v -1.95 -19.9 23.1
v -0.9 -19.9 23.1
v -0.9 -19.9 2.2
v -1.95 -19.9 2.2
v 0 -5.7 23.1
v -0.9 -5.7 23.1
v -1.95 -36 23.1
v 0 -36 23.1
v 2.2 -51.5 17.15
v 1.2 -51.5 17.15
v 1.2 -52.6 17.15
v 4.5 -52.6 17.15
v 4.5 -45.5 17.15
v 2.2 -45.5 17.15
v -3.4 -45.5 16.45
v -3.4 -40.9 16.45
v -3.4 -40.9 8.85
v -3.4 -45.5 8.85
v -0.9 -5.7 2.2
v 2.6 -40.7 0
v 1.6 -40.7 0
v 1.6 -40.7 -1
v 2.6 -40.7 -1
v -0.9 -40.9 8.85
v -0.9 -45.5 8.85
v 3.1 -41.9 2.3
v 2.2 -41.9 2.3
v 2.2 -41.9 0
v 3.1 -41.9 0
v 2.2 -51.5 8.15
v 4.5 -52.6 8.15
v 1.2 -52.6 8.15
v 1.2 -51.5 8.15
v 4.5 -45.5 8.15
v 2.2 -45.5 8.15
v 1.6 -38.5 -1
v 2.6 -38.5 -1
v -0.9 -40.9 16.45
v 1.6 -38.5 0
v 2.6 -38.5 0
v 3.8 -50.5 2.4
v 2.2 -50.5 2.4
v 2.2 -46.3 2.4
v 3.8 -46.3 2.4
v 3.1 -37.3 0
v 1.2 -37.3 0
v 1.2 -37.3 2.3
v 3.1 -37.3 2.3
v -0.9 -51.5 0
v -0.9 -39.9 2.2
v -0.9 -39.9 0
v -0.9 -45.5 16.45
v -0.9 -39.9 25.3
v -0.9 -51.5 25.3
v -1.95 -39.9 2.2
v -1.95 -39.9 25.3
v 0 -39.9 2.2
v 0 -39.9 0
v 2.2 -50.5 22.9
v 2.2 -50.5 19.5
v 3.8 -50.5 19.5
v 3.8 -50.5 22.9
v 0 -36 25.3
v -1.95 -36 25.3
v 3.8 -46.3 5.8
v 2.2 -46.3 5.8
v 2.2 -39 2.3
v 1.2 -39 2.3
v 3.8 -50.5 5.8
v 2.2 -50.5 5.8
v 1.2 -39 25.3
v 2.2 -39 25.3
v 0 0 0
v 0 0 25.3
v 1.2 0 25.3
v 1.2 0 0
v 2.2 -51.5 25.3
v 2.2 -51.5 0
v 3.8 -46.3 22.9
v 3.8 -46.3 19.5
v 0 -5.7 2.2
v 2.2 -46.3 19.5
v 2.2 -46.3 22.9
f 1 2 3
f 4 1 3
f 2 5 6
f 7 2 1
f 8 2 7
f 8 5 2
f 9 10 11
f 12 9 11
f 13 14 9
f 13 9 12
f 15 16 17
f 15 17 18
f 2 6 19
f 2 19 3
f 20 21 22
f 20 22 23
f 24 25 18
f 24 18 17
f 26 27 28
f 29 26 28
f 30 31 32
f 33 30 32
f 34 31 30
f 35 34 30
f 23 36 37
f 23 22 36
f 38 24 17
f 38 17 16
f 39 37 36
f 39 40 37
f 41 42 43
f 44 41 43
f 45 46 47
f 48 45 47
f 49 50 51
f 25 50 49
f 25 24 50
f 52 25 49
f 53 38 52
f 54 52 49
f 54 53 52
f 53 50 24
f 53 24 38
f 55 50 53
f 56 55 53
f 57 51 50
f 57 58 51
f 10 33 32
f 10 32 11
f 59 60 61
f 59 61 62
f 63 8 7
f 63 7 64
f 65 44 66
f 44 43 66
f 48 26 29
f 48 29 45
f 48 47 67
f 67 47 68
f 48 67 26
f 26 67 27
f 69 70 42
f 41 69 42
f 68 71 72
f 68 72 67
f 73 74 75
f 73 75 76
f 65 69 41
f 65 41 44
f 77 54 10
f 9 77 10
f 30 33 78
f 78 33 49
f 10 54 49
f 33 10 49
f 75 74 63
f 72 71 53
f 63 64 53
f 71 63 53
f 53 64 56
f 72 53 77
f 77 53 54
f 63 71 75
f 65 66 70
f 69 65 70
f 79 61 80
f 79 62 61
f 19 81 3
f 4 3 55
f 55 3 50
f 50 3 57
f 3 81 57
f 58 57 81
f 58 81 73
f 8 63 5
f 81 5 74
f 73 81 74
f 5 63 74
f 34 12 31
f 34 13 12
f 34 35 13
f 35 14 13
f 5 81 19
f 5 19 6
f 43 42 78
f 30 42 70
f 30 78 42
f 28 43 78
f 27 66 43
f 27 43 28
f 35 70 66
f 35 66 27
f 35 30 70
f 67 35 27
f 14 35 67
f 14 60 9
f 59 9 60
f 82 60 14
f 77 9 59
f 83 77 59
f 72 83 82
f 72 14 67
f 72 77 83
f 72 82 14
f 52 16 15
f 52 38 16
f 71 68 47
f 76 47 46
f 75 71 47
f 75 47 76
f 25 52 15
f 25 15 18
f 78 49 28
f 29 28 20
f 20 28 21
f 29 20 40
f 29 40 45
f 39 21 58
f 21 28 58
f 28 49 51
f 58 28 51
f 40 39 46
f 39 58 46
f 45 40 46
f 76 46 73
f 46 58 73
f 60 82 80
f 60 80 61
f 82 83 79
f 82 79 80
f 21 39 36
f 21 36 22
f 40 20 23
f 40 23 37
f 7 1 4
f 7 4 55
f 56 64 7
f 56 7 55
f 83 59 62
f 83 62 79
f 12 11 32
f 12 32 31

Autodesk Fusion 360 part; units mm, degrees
sketch "Sketch1" plane through (0, 0, 0) normal (1, 0, 0) x (0, 1, 0)
  line L0 (0, 0) -> (-51.5, 0)
  line L1 (-51.5, 0) -> (-51.5, 25.3)
  line L2 (-51.5, 25.3) -> (0, 25.3)
  line L3 (0, 25.3) -> (0, 0)
  dimension "d1" = 25.3
  dimension "d2" = 51.5
extrude "Extrude1" add sketch "Sketch1" along normal blind 1.2 makes body 1
sketch "Sketch2" plane through (0, -51.5, 0) normal (0, -1, 0) x (1, 0, 0)
  line L0 (0, 25.3) -> (0, 0)
  line L1 (0, 0) -> (1.2, 0)
  line L2 (1.2, 0) -> (1.2, 25.3)
  line L3 (1.2, 25.3) -> (0, 25.3)
  line L4 (1.2, 17.15) -> (4.5, 17.15)
  line L5 (4.5, 17.15) -> (4.5, 8.15)
  line L6 (4.5, 8.15) -> (1.2, 8.15)
  line L7 (1.2, 8.15) -> (1.2, 17.15)
  line L8 (4.5, 12.65) -> (1.2, 12.65)
  line L9 (1.2, 25.3) -> (1.2, 0)
  dimension "d5" = 9
  dimension "d7" = 4.5
extrude "Extrude2" add sketch "Sketch2" along normal blind 1.1 and the other way blind 6 separate body contours L2 L4 L5 L7 L8 L9 | L2 L5 L6 L7 L8 L9 makes body 2
sketch "Sketch3" plane through (1.2, 0, 0) normal (1, 0, 0) x (0, 1, 0)
  line L0 (0, 25.3) -> (-51.5, 25.3)
  line L1 (-51.5, 25.3) -> (-51.5, 0)
  line L2 (-51.5, 0) -> (0, 0)
  line L3 (0, 0) -> (0, 25.3)
  line L4 (-50.5, 22.9) -> (-46.3, 22.9)
  line L5 (-46.3, 22.9) -> (-46.3, 19.5)
  line L6 (-46.3, 19.5) -> (-50.5, 19.5)
  line L7 (-50.5, 19.5) -> (-50.5, 22.9)
  line L8 (0, 12.65) -> (-51.5, 12.65)
  line L9 (-46.3, 2.4) -> (-46.3, 5.8)
  line L10 (-50.5, 2.4) -> (-46.3, 2.4)
  line L11 (-50.5, 5.8) -> (-50.5, 2.4)
  line L12 (-46.3, 5.8) -> (-50.5, 5.8)
  dimension "d12" = 3.4
  dimension "d13" = 4.2
  dimension "d14" = 2.4
  dimension "d15" = 1
extrude "Extrude3" add sketch "Sketch3" along normal blind 2.6 contours L4 L5 L6 L7 | L9 L10 L11 L12 bodies 1
sketch "Sketch4" plane through (0, 0, 0) normal (-1, 0, 0) x (0, -1, 0)
  line L0 (51.5, 25.3) -> (0, 25.3)
  line L1 (0, 25.3) -> (0, 0)
  line L2 (0, 0) -> (51.5, 0)
  line L3 (51.5, 0) -> (51.5, 25.3)
  line L4 (40.9, 16.45) -> (45.5, 16.45)
  line L5 (45.5, 16.45) -> (45.5, 8.85)
  line L6 (45.5, 8.85) -> (40.9, 8.85)
  line L7 (40.9, 8.85) -> (40.9, 16.45)
  line L8 (51.5, 25.3) -> (51.5, 0)
  line L9 (40.9, 12.65) -> (45.5, 12.65)
  line L10 (51.5, 12.65) -> (0, 12.65)
  dimension "d18" = 7.6
  dimension "d19" = 4.6
  dimension "d20" = 6
extrude "Extrude4" add sketch "Sketch4" along normal blind 3.4 contours L4 L5 L7 L9 L10 | L5 L6 L7 L9 L10 bodies 1
sketch "Sketch5" plane through (1.2, 0, 0) normal (1, 0, 0) x (0, 1, 0)
  line L0 (-46.3, 5.8) -> (-46.3, 2.4)
  line L1 (-46.3, 2.4) -> (-50.5, 2.4)
  line L2 (-50.5, 2.4) -> (-50.5, 5.8)
  line L3 (-50.5, 5.8) -> (-46.3, 5.8)
  line L4 (-50.5, 19.5) -> (-50.5, 22.9)
  line L5 (-50.5, 22.9) -> (-46.3, 22.9)
  line L6 (-46.3, 22.9) -> (-46.3, 19.5)
  line L7 (-46.3, 19.5) -> (-50.5, 19.5)
  line L8 (0, 25.3) -> (-51.5, 25.3)
  line L9 (-51.5, 25.3) -> (-51.5, 0)
  line L10 (-51.5, 0) -> (0, 0)
  line L11 (0, 0) -> (0, 25.3)
  line L12 (-41.9, 0) -> (-37.3, 0)
  line L13 (-37.3, 0) -> (-37.3, 2.3)
  line L14 (-37.3, 2.3) -> (-41.9, 2.3)
  line L15 (-41.9, 2.3) -> (-41.9, 0)
  dimension "d23" = 4.6
  dimension "d24" = 2.3
  dimension "d25" = 14.2
extrude "Extrude5" add sketch "Sketch5" along normal blind 1.9 contours L10 L12 L13 L14 L15 bodies 1
sketch "Sketch6" plane through (0, 0, 0) normal (0, 0, -1) x (1, 0, 0)
  line L0 (0, 51.5) -> (0, 0)
  line L1 (0, 0) -> (1.2, 0)
  line L2 (1.2, 0) -> (1.2, 37.3)
  line L3 (1.2, 37.3) -> (3.1, 37.3)
  line L4 (3.1, 37.3) -> (3.1, 41.9)
  line L5 (3.1, 41.9) -> (1.2, 41.9)
  line L6 (1.2, 41.9) -> (1.2, 51.5)
  line L7 (1.2, 51.5) -> (0, 51.5)
  line L8 (1.6, 40.7) -> (2.6, 40.7)
  line L9 (2.6, 40.7) -> (2.6, 38.5)
  line L10 (2.6, 38.5) -> (1.6, 38.5)
  line L11 (1.6, 38.5) -> (1.6, 40.7)
  dimension "d28" = 1.2
  dimension "d29" = 1.2
  dimension "d30" = 0.5
  dimension "d31" = 1
extrude "Extrude6" add sketch "Sketch6" along normal blind 1 contours L8 L9 L10 L11 bodies 1
sketch "Sketch7" plane through (0, 0, 0) normal (-1, 0, 0) x (0, -1, 0)
  line L0 (40.9, 8.85) -> (40.9, 16.45)
  line L1 (40.9, 16.45) -> (45.5, 16.45)
  line L2 (45.5, 16.45) -> (45.5, 8.85)
  line L3 (45.5, 8.85) -> (40.9, 8.85)
  line L4 (51.5, 25.3) -> (0, 25.3)
  line L5 (0, 25.3) -> (0, 0)
  line L6 (0, 0) -> (51.5, 0)
  line L7 (51.5, 0) -> (51.5, 25.3)
  line L8 (39.9, 25.3) -> (19.9, 25.3)
  line L9 (19.9, 25.3) -> (19.9, 2.2)
  line L10 (19.9, 2.2) -> (39.9, 2.2)
  line L11 (39.9, 2.2) -> (39.9, 25.3)
  line L12 (39.9, 25.3) -> (51.5, 25.3)
  line L13 (51.5, 25.3) -> (51.5, 0)
  line L14 (51.5, 0) -> (39.9, 0)
  line L15 (39.9, 0) -> (39.9, 25.3)
  line L16 (5.7, 23.1) -> (19.9, 23.1)
  line L17 (19.9, 23.1) -> (19.9, 2.2)
  line L18 (19.9, 2.2) -> (5.7, 2.2)
  line L19 (5.7, 2.2) -> (5.7, 23.1)
  line L20 (19.9, 23.1) -> (36, 23.1)
  line L21 (36, 23.1) -> (36, 25.3)
  dimension "d34" = 1
  dimension "d35" = 20
  dimension "d36" = 2.2
  dimension "d37" = 5.7
  dimension "d38" = 2.2
  dimension "d39" = 2.2
  dimension "d40" = 36
extrude "Extrude7" add sketch "Sketch7" along normal blind 1.95 contours L4 L8 L9 L10 L11 L15 L17 L20 L21 bodies 1
extrude "Extrude8" add sketch "Sketch7" along normal blind 0.9 contours L4 L6 L7 L11 L12 L13 L14 L15 | L9 L16 L17 L18 L19 bodies 1
sketch "Sketch8" plane through (1.2, 0, 0) normal (1, 0, 0) x (0, 1, 0)
  line L0 (-37.3, 2.3) -> (-37.3, 0)
  line L1 (-37.3, 0) -> (0, 0)
  line L2 (0, 0) -> (0, 25.3)
  line L3 (0, 25.3) -> (-51.5, 25.3)
  line L4 (-51.5, 25.3) -> (-51.5, 0)
  line L5 (-51.5, 0) -> (-41.9, 0)
  line L6 (-41.9, 0) -> (-41.9, 2.3)
  line L7 (-41.9, 2.3) -> (-37.3, 2.3)
  line L8 (-46.3, 5.8) -> (-46.3, 2.4)
  line L9 (-46.3, 2.4) -> (-50.5, 2.4)
  line L10 (-50.5, 2.4) -> (-50.5, 5.8)
  line L11 (-50.5, 5.8) -> (-46.3, 5.8)
  line L12 (-50.5, 19.5) -> (-50.5, 22.9)
  line L13 (-50.5, 22.9) -> (-46.3, 22.9)
  line L14 (-46.3, 22.9) -> (-46.3, 19.5)
  line L15 (-46.3, 19.5) -> (-50.5, 19.5)
  line L16 (-51.5, 25.3) -> (-39, 25.3)
  line L17 (-39, 25.3) -> (-39, 0)
  line L18 (-39, 0) -> (-51.5, 0)
  line L19 (-51.5, 0) -> (-51.5, 25.3)
  dimension "d45" = 12.5
extrude "Extrude9" add sketch "Sketch8" along normal blind 1 contours L3 L4 L5 L6 L7 L16 L17 L18 L19 bodies 2 1
equation "d38 = d36"
equation "d39 = d38"
equation "d41 = 3.15 mm - 1.2 mm"
equation "d43 = 2.1 mm - 1.2 mm"
